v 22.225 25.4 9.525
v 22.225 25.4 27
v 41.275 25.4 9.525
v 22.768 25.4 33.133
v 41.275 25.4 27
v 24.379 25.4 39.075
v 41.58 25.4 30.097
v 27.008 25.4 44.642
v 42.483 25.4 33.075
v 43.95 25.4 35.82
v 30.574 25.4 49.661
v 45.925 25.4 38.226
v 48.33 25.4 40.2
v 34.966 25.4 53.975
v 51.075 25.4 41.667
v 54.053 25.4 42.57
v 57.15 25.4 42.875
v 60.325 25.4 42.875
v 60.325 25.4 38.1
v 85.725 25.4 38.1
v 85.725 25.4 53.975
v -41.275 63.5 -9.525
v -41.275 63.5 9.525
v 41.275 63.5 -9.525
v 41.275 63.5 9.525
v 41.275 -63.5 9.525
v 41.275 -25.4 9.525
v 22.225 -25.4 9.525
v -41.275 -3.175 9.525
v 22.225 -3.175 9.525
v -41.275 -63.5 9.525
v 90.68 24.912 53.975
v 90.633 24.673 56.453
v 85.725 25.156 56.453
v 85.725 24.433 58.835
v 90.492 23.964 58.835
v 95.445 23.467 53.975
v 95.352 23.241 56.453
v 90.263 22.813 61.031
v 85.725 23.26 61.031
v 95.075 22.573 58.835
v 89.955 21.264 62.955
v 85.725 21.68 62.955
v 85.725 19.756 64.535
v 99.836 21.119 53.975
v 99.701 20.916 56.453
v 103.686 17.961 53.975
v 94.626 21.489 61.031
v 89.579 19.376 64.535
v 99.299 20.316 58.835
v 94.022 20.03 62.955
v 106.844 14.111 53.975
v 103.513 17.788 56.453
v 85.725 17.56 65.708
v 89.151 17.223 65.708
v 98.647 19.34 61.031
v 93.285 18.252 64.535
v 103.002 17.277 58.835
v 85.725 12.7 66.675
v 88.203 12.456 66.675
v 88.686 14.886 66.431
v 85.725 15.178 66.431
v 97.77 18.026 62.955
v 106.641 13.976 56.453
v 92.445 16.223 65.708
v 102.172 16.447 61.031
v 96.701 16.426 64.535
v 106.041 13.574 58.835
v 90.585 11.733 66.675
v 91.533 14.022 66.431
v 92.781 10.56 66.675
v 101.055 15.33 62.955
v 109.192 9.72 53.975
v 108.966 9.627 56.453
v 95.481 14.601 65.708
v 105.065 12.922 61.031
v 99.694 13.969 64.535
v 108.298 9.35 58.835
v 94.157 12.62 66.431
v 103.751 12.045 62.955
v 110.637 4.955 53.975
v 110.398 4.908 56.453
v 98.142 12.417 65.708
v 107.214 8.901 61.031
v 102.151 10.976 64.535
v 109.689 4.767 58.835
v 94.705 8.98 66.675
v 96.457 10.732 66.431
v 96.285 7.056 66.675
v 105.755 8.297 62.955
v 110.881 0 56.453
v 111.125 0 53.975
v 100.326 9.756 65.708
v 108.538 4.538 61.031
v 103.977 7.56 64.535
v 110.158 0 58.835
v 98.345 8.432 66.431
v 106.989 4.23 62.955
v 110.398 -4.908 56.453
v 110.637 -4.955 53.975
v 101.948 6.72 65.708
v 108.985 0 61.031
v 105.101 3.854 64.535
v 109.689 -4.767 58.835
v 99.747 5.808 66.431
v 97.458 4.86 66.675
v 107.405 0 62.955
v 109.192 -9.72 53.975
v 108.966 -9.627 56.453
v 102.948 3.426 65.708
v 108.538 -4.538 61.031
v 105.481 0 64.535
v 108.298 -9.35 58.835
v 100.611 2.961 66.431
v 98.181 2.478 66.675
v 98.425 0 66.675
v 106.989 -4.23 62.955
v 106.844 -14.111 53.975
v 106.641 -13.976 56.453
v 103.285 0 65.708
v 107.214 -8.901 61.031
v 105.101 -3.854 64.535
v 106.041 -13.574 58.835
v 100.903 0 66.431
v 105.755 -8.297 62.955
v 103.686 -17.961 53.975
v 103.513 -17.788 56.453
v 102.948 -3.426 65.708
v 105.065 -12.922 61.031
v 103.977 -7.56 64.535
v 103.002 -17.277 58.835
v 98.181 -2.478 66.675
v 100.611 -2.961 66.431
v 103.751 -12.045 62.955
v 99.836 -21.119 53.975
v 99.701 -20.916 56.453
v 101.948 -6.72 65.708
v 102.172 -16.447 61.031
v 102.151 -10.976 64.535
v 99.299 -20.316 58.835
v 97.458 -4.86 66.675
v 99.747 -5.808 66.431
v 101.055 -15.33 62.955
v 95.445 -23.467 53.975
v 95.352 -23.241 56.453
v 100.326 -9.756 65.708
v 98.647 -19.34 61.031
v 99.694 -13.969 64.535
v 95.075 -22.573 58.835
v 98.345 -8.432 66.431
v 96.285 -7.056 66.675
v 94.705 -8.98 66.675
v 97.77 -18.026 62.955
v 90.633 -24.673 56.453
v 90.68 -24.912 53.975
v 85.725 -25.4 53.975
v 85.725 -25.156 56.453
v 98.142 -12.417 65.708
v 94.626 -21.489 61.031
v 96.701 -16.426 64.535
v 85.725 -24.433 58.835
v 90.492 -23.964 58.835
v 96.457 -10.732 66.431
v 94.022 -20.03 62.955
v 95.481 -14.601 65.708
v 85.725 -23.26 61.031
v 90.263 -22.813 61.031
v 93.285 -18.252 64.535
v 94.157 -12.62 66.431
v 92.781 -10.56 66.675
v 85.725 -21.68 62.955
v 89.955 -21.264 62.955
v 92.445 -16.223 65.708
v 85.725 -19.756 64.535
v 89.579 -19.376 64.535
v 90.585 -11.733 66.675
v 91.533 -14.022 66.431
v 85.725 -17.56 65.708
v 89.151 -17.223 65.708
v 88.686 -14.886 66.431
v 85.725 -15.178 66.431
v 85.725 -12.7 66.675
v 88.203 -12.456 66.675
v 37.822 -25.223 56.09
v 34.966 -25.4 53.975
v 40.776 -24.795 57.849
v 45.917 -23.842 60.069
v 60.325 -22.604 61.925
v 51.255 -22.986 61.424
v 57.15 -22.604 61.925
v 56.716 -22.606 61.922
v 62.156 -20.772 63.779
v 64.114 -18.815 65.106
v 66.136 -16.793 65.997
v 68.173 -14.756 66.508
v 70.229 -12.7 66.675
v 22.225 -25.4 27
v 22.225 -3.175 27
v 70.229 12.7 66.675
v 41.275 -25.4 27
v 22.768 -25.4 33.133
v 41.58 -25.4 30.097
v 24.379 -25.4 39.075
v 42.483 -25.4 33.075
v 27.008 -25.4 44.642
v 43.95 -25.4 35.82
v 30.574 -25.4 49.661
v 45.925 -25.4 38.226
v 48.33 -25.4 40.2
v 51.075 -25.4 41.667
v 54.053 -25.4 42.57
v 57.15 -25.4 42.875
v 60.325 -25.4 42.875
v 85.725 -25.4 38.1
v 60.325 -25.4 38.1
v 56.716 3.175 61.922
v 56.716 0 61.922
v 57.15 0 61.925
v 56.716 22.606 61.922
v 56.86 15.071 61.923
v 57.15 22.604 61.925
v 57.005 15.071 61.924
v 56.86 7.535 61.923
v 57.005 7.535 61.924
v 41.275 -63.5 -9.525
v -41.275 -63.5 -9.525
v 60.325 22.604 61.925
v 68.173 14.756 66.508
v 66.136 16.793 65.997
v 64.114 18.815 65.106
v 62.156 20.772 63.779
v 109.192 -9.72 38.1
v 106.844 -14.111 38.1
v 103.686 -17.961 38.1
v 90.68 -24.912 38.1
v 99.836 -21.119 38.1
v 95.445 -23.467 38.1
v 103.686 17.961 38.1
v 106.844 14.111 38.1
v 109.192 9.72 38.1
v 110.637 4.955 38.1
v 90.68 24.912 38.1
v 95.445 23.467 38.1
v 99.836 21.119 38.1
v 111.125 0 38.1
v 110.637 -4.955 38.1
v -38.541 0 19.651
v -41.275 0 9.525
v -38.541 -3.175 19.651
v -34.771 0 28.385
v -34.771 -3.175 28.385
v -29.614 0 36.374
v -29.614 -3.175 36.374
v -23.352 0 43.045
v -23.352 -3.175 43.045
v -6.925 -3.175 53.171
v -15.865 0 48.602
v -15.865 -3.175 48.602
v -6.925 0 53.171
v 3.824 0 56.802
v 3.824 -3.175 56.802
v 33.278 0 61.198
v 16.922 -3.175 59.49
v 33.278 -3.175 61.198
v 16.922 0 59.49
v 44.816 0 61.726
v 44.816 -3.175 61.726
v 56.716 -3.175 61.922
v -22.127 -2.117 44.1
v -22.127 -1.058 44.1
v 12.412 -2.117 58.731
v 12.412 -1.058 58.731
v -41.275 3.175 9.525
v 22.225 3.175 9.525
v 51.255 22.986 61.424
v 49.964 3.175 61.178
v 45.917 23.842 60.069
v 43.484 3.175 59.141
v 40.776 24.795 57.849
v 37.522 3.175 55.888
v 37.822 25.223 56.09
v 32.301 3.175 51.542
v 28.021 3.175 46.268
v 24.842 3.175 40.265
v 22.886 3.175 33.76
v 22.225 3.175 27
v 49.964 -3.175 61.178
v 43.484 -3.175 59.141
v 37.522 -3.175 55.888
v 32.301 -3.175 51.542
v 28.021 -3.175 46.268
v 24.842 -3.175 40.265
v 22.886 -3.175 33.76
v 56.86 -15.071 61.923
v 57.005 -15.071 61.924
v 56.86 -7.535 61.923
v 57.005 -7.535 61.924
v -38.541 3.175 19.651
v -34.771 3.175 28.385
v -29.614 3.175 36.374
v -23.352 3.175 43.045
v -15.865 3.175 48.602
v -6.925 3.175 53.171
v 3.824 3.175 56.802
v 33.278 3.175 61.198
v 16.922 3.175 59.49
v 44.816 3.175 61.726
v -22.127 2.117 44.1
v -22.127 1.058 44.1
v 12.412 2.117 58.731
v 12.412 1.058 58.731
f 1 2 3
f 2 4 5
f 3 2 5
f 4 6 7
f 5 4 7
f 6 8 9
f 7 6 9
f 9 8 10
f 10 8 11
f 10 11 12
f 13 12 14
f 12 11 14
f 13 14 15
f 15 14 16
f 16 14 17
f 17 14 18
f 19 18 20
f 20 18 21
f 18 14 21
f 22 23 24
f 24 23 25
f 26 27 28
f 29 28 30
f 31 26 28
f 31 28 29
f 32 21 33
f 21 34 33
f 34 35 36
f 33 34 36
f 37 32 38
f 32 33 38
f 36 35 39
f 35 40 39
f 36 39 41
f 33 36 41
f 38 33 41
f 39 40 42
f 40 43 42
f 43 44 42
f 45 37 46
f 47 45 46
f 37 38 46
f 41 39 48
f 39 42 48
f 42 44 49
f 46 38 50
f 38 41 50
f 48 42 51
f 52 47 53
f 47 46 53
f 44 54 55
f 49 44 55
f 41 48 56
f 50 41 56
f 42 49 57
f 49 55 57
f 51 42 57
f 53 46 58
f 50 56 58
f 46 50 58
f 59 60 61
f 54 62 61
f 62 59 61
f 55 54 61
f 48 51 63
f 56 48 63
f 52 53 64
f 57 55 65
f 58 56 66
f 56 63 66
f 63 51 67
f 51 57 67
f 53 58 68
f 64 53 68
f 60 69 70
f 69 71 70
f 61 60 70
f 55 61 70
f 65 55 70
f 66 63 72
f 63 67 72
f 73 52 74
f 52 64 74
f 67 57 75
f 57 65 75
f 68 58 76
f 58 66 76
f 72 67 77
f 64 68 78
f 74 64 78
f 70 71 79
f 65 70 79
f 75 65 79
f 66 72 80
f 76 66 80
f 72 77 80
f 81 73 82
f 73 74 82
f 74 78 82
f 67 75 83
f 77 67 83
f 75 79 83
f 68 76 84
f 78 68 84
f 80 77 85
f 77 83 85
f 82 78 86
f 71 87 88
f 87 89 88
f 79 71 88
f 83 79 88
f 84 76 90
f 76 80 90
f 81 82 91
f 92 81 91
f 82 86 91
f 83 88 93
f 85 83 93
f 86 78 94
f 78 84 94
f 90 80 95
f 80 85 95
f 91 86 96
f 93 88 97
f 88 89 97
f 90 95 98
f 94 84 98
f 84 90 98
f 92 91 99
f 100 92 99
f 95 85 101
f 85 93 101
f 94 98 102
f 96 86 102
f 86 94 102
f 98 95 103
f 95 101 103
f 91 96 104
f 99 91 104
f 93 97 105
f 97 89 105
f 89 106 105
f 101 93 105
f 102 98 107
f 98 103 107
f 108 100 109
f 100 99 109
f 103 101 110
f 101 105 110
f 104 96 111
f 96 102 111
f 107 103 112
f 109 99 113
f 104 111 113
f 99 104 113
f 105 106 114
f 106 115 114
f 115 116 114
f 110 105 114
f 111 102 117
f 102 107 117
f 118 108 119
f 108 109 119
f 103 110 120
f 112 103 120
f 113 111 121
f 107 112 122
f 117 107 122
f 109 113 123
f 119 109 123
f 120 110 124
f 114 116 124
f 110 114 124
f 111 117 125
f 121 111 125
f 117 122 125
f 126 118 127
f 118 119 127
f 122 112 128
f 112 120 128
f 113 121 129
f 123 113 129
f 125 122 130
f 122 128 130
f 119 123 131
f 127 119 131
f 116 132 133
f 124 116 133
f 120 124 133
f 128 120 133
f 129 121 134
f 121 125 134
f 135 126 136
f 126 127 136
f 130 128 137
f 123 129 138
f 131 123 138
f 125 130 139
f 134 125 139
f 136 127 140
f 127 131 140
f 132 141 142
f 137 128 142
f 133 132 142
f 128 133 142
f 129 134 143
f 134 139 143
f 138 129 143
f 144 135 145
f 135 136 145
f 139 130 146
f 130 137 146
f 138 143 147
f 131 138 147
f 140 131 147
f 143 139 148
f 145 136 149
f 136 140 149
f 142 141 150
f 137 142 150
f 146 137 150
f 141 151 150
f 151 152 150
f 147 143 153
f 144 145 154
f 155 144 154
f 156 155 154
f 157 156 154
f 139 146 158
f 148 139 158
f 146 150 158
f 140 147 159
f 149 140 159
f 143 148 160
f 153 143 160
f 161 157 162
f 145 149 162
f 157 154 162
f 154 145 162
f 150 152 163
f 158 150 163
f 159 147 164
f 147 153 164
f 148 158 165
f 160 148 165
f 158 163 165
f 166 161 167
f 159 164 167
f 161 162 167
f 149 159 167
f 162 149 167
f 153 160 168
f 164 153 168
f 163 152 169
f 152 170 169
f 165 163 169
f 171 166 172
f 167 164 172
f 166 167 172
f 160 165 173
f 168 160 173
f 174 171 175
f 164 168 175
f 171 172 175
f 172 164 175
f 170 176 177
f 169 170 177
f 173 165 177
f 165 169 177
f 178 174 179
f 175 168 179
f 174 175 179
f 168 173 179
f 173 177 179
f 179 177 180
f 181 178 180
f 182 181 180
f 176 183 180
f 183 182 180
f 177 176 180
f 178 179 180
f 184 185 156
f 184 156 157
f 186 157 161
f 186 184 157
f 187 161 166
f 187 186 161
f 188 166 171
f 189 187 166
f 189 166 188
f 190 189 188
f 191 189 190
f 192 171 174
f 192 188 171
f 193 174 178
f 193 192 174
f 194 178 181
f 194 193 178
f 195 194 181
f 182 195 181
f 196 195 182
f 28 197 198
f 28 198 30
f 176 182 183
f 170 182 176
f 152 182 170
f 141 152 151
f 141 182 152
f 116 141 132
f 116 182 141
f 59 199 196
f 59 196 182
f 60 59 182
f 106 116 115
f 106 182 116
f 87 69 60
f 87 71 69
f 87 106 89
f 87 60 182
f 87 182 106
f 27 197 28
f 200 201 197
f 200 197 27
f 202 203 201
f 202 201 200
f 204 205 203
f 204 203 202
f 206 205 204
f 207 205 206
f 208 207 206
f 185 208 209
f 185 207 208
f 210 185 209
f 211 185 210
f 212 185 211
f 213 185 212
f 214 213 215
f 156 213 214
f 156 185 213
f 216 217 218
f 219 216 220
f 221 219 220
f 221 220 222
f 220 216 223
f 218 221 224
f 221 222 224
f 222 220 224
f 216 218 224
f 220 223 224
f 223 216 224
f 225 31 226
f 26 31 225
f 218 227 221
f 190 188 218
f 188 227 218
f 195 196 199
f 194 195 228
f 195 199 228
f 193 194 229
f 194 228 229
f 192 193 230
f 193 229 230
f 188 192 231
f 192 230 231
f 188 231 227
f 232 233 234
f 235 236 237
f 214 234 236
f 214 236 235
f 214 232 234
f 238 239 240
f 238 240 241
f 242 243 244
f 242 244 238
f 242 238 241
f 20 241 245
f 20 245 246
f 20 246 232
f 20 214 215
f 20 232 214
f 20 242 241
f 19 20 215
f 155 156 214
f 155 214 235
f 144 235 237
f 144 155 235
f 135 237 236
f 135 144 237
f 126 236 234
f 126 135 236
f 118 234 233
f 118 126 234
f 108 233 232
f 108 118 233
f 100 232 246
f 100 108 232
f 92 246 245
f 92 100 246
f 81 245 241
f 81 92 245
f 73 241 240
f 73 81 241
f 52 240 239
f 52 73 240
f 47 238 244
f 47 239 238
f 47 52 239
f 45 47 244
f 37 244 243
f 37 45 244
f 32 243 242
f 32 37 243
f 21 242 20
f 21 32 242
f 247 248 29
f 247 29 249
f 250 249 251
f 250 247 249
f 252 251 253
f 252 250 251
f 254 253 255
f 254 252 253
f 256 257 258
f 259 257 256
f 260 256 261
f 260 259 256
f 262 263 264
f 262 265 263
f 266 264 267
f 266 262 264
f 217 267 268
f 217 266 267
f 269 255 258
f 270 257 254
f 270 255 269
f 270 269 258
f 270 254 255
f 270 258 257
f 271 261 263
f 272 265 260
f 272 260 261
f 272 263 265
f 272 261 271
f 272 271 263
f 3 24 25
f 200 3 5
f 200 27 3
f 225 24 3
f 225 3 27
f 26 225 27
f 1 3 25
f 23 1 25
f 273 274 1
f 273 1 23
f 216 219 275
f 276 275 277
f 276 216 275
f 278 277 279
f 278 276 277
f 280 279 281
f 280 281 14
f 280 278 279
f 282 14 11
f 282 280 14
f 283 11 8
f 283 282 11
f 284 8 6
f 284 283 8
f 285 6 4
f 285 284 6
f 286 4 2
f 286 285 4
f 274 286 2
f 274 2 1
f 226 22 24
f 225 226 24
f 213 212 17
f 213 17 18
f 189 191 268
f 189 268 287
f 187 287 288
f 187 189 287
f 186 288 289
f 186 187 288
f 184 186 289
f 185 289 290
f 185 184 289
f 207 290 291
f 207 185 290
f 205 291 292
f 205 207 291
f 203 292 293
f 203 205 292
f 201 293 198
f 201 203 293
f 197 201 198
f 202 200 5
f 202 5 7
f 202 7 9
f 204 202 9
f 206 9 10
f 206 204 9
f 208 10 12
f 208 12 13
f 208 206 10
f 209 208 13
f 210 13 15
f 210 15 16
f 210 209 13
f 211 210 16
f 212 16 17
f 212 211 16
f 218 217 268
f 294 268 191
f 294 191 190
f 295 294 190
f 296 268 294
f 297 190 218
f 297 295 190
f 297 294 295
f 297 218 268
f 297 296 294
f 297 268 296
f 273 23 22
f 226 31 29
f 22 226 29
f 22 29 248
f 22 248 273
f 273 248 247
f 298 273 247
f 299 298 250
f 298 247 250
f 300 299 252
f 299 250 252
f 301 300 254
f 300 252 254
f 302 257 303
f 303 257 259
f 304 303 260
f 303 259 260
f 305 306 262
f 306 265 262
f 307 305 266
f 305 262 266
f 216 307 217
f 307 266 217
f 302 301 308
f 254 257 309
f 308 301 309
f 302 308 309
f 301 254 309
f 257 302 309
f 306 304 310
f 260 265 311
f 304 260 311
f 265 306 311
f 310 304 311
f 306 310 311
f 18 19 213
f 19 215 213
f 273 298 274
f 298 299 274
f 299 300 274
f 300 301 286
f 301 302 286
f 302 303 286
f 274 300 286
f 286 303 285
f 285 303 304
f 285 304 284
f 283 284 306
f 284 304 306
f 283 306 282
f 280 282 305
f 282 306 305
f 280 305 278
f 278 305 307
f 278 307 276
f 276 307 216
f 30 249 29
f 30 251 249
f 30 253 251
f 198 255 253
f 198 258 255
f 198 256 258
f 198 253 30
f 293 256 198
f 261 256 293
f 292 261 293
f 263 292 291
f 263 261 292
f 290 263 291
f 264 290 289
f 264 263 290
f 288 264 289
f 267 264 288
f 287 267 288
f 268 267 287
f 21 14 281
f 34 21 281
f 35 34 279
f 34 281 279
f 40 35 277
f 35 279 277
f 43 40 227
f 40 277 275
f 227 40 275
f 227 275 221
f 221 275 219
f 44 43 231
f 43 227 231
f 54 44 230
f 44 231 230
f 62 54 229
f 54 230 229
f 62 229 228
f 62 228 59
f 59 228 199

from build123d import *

# Parameters (mm, degrees)
F1_DEPTH    = 63.5
F0_W        = 25.4
F0_H        = 19.05
F0_H_2      = 4.7498
F0_H_3      = 4.7752
F2_DEPTH    = 25.4
F4_DEPTH    = 3.175
F5_T1_DEPTH = 100.3187641102
F5_T3_DEPTH = 57.15
F5_T6_ANGLE = 180


# Not quite as in the source:
# - a fillet or chamfer that OpenCascade refuses, or shapes differently, is made with other operations: its cross-section is extruded or revolved along the edge and cut away or added


with BuildPart() as f1:
    # F0 (on Front) → F1 (new body, symmetric)
    with BuildSketch(Plane.XZ):
        Polygon((41.275, -9.525), (41.275, 9.525), (22.225, 9.525), (-41.275, 9.525), (-41.275, -9.525), align=None)
    extrude(amount=F1_DEPTH, both=True)

    # F0 (on Front) → F2 (join, symmetric)
    with BuildSketch(Plane.XZ):
        with BuildLine():
            Line((22.225, 9.525), (41.275, 9.525))
            Line((41.275, 9.525), (41.275, 27.0002))
            ThreePointArc((41.275, 27.0002), (45.9246798487, 38.2255201513), (57.15, 42.8752))
            Line((57.15, 42.8752), (60.325, 42.8752))
            Line((60.325, 42.8752), (60.325, 61.9252))
            Line((60.325, 61.9252), (57.15, 61.9252))
            add(Edge.make_bspline(
                [(56.7157172379, 61.9224998023), (56.8604203243, 61.9234406697), (57.0051814864, 61.9243403706), (57.15, 61.9252)],
                knots=[111.1645323541, 111.1645323541, 111.1645323541, 111.1645323541, 111.5045361635, 111.5045361635, 111.5045361635, 111.5045361635], degree=3))
            ThreePointArc((56.7157172379, 61.9224998023), (32.3012278929, 51.5418818855), (22.225, 27.0002))
            Line((22.225, 27.0002), (22.225, 9.525))
        make_face()
        with Locations((73.025, 52.4002)):
            Rectangle(F0_W, F0_H)
        with Locations((73.025, 64.3001)):
            Rectangle(F0_W, F0_H_2)
        with Locations((73.025, 40.4876)):
            Rectangle(F0_W, F0_H_3)
    extrude(amount=F2_DEPTH, both=True)

    # F0 (on Front) → F3 (revolve)
    with BuildSketch(Plane.XZ):
        Polygon((85.725, 61.9252), (85.725, 42.8752), (85.725, 38.1), (111.125, 38.1), (111.125, 66.675), (85.725, 66.675), align=None)
    revolve(axis=Axis((85.725, 0, 52.3875), (0, 0, 1)))

    # F0 (on Front) → F4 (join, symmetric)
    with BuildSketch(Plane.XZ):
        with BuildLine():
            Line((-41.275, 9.525), (22.225, 9.525))
            Line((22.225, 9.525), (22.225, 27.0002))
            ThreePointArc((22.225, 27.0002), (32.3012278929, 51.5418818855), (56.7157172379, 61.9224998023))
            add(Edge.make_bspline(
                [(-41.275, 9.525), (-31.6977544753, 56.9066902811), (9.4049210672, 61.6148824052), (56.7157172379, 61.9224998023)],
                knots=[0, 0, 0, 0, 111.1645323541, 111.1645323541, 111.1645323541, 111.1645323541], degree=3))
        make_face()
    extrude(amount=F4_DEPTH, both=True)

    # F5: fillet of radius 12.7 on 4 edges, made by hand

    # F5_s2 → F5_t1 (cut)
    with BuildSketch(Plane.XZ.offset(-50.1593820551)):
        with BuildLine():
            ThreePointArc((70.228752822, 66.675), (64.7368287512, 65.4261471041), (60.325, 61.9252))
            Line((60.325, 61.9252), (60.325, 66.675))
            Line((60.325, 66.675), (70.228752822, 66.675))
        make_face()
    extrude(amount=F5_T1_DEPTH, mode=Mode.SUBTRACT)

    # F5_s4 → F5_t3 (cut)
    with BuildSketch(Plane.YZ.offset(28.575)):
        with BuildLine():
            ThreePointArc((-25.4, 53.975), (-21.6802561211, 62.9552561211), (-12.7, 66.675))
            Line((-12.7, 66.675), (-25.4, 66.675))
            Line((-25.4, 66.675), (-25.4, 53.975))
        make_face()
        with BuildLine():
            ThreePointArc((25.4, 53.975), (21.6802561211, 62.9552561211), (12.7, 66.675))
            Line((12.7, 66.675), (25.4, 66.675))
            Line((25.4, 66.675), (25.4, 53.975))
        make_face()
    extrude(amount=F5_T3_DEPTH, mode=Mode.SUBTRACT)

    # F5_s5 → F5_t6 (revolve, cut)
    with BuildSketch(Plane.YZ.offset(85.725)):
        with BuildLine():
            ThreePointArc((25.4, 53.975), (21.6802561211, 62.9552561211), (12.7, 66.675))
            Line((12.7, 66.675), (25.4, 66.675))
            Line((25.4, 66.675), (25.4, 53.975))
        make_face()
    revolve(axis=Axis((85.725, 0, 66.675), (0, 0, -1)), revolution_arc=F5_T6_ANGLE, mode=Mode.SUBTRACT)


solid = f1.part
